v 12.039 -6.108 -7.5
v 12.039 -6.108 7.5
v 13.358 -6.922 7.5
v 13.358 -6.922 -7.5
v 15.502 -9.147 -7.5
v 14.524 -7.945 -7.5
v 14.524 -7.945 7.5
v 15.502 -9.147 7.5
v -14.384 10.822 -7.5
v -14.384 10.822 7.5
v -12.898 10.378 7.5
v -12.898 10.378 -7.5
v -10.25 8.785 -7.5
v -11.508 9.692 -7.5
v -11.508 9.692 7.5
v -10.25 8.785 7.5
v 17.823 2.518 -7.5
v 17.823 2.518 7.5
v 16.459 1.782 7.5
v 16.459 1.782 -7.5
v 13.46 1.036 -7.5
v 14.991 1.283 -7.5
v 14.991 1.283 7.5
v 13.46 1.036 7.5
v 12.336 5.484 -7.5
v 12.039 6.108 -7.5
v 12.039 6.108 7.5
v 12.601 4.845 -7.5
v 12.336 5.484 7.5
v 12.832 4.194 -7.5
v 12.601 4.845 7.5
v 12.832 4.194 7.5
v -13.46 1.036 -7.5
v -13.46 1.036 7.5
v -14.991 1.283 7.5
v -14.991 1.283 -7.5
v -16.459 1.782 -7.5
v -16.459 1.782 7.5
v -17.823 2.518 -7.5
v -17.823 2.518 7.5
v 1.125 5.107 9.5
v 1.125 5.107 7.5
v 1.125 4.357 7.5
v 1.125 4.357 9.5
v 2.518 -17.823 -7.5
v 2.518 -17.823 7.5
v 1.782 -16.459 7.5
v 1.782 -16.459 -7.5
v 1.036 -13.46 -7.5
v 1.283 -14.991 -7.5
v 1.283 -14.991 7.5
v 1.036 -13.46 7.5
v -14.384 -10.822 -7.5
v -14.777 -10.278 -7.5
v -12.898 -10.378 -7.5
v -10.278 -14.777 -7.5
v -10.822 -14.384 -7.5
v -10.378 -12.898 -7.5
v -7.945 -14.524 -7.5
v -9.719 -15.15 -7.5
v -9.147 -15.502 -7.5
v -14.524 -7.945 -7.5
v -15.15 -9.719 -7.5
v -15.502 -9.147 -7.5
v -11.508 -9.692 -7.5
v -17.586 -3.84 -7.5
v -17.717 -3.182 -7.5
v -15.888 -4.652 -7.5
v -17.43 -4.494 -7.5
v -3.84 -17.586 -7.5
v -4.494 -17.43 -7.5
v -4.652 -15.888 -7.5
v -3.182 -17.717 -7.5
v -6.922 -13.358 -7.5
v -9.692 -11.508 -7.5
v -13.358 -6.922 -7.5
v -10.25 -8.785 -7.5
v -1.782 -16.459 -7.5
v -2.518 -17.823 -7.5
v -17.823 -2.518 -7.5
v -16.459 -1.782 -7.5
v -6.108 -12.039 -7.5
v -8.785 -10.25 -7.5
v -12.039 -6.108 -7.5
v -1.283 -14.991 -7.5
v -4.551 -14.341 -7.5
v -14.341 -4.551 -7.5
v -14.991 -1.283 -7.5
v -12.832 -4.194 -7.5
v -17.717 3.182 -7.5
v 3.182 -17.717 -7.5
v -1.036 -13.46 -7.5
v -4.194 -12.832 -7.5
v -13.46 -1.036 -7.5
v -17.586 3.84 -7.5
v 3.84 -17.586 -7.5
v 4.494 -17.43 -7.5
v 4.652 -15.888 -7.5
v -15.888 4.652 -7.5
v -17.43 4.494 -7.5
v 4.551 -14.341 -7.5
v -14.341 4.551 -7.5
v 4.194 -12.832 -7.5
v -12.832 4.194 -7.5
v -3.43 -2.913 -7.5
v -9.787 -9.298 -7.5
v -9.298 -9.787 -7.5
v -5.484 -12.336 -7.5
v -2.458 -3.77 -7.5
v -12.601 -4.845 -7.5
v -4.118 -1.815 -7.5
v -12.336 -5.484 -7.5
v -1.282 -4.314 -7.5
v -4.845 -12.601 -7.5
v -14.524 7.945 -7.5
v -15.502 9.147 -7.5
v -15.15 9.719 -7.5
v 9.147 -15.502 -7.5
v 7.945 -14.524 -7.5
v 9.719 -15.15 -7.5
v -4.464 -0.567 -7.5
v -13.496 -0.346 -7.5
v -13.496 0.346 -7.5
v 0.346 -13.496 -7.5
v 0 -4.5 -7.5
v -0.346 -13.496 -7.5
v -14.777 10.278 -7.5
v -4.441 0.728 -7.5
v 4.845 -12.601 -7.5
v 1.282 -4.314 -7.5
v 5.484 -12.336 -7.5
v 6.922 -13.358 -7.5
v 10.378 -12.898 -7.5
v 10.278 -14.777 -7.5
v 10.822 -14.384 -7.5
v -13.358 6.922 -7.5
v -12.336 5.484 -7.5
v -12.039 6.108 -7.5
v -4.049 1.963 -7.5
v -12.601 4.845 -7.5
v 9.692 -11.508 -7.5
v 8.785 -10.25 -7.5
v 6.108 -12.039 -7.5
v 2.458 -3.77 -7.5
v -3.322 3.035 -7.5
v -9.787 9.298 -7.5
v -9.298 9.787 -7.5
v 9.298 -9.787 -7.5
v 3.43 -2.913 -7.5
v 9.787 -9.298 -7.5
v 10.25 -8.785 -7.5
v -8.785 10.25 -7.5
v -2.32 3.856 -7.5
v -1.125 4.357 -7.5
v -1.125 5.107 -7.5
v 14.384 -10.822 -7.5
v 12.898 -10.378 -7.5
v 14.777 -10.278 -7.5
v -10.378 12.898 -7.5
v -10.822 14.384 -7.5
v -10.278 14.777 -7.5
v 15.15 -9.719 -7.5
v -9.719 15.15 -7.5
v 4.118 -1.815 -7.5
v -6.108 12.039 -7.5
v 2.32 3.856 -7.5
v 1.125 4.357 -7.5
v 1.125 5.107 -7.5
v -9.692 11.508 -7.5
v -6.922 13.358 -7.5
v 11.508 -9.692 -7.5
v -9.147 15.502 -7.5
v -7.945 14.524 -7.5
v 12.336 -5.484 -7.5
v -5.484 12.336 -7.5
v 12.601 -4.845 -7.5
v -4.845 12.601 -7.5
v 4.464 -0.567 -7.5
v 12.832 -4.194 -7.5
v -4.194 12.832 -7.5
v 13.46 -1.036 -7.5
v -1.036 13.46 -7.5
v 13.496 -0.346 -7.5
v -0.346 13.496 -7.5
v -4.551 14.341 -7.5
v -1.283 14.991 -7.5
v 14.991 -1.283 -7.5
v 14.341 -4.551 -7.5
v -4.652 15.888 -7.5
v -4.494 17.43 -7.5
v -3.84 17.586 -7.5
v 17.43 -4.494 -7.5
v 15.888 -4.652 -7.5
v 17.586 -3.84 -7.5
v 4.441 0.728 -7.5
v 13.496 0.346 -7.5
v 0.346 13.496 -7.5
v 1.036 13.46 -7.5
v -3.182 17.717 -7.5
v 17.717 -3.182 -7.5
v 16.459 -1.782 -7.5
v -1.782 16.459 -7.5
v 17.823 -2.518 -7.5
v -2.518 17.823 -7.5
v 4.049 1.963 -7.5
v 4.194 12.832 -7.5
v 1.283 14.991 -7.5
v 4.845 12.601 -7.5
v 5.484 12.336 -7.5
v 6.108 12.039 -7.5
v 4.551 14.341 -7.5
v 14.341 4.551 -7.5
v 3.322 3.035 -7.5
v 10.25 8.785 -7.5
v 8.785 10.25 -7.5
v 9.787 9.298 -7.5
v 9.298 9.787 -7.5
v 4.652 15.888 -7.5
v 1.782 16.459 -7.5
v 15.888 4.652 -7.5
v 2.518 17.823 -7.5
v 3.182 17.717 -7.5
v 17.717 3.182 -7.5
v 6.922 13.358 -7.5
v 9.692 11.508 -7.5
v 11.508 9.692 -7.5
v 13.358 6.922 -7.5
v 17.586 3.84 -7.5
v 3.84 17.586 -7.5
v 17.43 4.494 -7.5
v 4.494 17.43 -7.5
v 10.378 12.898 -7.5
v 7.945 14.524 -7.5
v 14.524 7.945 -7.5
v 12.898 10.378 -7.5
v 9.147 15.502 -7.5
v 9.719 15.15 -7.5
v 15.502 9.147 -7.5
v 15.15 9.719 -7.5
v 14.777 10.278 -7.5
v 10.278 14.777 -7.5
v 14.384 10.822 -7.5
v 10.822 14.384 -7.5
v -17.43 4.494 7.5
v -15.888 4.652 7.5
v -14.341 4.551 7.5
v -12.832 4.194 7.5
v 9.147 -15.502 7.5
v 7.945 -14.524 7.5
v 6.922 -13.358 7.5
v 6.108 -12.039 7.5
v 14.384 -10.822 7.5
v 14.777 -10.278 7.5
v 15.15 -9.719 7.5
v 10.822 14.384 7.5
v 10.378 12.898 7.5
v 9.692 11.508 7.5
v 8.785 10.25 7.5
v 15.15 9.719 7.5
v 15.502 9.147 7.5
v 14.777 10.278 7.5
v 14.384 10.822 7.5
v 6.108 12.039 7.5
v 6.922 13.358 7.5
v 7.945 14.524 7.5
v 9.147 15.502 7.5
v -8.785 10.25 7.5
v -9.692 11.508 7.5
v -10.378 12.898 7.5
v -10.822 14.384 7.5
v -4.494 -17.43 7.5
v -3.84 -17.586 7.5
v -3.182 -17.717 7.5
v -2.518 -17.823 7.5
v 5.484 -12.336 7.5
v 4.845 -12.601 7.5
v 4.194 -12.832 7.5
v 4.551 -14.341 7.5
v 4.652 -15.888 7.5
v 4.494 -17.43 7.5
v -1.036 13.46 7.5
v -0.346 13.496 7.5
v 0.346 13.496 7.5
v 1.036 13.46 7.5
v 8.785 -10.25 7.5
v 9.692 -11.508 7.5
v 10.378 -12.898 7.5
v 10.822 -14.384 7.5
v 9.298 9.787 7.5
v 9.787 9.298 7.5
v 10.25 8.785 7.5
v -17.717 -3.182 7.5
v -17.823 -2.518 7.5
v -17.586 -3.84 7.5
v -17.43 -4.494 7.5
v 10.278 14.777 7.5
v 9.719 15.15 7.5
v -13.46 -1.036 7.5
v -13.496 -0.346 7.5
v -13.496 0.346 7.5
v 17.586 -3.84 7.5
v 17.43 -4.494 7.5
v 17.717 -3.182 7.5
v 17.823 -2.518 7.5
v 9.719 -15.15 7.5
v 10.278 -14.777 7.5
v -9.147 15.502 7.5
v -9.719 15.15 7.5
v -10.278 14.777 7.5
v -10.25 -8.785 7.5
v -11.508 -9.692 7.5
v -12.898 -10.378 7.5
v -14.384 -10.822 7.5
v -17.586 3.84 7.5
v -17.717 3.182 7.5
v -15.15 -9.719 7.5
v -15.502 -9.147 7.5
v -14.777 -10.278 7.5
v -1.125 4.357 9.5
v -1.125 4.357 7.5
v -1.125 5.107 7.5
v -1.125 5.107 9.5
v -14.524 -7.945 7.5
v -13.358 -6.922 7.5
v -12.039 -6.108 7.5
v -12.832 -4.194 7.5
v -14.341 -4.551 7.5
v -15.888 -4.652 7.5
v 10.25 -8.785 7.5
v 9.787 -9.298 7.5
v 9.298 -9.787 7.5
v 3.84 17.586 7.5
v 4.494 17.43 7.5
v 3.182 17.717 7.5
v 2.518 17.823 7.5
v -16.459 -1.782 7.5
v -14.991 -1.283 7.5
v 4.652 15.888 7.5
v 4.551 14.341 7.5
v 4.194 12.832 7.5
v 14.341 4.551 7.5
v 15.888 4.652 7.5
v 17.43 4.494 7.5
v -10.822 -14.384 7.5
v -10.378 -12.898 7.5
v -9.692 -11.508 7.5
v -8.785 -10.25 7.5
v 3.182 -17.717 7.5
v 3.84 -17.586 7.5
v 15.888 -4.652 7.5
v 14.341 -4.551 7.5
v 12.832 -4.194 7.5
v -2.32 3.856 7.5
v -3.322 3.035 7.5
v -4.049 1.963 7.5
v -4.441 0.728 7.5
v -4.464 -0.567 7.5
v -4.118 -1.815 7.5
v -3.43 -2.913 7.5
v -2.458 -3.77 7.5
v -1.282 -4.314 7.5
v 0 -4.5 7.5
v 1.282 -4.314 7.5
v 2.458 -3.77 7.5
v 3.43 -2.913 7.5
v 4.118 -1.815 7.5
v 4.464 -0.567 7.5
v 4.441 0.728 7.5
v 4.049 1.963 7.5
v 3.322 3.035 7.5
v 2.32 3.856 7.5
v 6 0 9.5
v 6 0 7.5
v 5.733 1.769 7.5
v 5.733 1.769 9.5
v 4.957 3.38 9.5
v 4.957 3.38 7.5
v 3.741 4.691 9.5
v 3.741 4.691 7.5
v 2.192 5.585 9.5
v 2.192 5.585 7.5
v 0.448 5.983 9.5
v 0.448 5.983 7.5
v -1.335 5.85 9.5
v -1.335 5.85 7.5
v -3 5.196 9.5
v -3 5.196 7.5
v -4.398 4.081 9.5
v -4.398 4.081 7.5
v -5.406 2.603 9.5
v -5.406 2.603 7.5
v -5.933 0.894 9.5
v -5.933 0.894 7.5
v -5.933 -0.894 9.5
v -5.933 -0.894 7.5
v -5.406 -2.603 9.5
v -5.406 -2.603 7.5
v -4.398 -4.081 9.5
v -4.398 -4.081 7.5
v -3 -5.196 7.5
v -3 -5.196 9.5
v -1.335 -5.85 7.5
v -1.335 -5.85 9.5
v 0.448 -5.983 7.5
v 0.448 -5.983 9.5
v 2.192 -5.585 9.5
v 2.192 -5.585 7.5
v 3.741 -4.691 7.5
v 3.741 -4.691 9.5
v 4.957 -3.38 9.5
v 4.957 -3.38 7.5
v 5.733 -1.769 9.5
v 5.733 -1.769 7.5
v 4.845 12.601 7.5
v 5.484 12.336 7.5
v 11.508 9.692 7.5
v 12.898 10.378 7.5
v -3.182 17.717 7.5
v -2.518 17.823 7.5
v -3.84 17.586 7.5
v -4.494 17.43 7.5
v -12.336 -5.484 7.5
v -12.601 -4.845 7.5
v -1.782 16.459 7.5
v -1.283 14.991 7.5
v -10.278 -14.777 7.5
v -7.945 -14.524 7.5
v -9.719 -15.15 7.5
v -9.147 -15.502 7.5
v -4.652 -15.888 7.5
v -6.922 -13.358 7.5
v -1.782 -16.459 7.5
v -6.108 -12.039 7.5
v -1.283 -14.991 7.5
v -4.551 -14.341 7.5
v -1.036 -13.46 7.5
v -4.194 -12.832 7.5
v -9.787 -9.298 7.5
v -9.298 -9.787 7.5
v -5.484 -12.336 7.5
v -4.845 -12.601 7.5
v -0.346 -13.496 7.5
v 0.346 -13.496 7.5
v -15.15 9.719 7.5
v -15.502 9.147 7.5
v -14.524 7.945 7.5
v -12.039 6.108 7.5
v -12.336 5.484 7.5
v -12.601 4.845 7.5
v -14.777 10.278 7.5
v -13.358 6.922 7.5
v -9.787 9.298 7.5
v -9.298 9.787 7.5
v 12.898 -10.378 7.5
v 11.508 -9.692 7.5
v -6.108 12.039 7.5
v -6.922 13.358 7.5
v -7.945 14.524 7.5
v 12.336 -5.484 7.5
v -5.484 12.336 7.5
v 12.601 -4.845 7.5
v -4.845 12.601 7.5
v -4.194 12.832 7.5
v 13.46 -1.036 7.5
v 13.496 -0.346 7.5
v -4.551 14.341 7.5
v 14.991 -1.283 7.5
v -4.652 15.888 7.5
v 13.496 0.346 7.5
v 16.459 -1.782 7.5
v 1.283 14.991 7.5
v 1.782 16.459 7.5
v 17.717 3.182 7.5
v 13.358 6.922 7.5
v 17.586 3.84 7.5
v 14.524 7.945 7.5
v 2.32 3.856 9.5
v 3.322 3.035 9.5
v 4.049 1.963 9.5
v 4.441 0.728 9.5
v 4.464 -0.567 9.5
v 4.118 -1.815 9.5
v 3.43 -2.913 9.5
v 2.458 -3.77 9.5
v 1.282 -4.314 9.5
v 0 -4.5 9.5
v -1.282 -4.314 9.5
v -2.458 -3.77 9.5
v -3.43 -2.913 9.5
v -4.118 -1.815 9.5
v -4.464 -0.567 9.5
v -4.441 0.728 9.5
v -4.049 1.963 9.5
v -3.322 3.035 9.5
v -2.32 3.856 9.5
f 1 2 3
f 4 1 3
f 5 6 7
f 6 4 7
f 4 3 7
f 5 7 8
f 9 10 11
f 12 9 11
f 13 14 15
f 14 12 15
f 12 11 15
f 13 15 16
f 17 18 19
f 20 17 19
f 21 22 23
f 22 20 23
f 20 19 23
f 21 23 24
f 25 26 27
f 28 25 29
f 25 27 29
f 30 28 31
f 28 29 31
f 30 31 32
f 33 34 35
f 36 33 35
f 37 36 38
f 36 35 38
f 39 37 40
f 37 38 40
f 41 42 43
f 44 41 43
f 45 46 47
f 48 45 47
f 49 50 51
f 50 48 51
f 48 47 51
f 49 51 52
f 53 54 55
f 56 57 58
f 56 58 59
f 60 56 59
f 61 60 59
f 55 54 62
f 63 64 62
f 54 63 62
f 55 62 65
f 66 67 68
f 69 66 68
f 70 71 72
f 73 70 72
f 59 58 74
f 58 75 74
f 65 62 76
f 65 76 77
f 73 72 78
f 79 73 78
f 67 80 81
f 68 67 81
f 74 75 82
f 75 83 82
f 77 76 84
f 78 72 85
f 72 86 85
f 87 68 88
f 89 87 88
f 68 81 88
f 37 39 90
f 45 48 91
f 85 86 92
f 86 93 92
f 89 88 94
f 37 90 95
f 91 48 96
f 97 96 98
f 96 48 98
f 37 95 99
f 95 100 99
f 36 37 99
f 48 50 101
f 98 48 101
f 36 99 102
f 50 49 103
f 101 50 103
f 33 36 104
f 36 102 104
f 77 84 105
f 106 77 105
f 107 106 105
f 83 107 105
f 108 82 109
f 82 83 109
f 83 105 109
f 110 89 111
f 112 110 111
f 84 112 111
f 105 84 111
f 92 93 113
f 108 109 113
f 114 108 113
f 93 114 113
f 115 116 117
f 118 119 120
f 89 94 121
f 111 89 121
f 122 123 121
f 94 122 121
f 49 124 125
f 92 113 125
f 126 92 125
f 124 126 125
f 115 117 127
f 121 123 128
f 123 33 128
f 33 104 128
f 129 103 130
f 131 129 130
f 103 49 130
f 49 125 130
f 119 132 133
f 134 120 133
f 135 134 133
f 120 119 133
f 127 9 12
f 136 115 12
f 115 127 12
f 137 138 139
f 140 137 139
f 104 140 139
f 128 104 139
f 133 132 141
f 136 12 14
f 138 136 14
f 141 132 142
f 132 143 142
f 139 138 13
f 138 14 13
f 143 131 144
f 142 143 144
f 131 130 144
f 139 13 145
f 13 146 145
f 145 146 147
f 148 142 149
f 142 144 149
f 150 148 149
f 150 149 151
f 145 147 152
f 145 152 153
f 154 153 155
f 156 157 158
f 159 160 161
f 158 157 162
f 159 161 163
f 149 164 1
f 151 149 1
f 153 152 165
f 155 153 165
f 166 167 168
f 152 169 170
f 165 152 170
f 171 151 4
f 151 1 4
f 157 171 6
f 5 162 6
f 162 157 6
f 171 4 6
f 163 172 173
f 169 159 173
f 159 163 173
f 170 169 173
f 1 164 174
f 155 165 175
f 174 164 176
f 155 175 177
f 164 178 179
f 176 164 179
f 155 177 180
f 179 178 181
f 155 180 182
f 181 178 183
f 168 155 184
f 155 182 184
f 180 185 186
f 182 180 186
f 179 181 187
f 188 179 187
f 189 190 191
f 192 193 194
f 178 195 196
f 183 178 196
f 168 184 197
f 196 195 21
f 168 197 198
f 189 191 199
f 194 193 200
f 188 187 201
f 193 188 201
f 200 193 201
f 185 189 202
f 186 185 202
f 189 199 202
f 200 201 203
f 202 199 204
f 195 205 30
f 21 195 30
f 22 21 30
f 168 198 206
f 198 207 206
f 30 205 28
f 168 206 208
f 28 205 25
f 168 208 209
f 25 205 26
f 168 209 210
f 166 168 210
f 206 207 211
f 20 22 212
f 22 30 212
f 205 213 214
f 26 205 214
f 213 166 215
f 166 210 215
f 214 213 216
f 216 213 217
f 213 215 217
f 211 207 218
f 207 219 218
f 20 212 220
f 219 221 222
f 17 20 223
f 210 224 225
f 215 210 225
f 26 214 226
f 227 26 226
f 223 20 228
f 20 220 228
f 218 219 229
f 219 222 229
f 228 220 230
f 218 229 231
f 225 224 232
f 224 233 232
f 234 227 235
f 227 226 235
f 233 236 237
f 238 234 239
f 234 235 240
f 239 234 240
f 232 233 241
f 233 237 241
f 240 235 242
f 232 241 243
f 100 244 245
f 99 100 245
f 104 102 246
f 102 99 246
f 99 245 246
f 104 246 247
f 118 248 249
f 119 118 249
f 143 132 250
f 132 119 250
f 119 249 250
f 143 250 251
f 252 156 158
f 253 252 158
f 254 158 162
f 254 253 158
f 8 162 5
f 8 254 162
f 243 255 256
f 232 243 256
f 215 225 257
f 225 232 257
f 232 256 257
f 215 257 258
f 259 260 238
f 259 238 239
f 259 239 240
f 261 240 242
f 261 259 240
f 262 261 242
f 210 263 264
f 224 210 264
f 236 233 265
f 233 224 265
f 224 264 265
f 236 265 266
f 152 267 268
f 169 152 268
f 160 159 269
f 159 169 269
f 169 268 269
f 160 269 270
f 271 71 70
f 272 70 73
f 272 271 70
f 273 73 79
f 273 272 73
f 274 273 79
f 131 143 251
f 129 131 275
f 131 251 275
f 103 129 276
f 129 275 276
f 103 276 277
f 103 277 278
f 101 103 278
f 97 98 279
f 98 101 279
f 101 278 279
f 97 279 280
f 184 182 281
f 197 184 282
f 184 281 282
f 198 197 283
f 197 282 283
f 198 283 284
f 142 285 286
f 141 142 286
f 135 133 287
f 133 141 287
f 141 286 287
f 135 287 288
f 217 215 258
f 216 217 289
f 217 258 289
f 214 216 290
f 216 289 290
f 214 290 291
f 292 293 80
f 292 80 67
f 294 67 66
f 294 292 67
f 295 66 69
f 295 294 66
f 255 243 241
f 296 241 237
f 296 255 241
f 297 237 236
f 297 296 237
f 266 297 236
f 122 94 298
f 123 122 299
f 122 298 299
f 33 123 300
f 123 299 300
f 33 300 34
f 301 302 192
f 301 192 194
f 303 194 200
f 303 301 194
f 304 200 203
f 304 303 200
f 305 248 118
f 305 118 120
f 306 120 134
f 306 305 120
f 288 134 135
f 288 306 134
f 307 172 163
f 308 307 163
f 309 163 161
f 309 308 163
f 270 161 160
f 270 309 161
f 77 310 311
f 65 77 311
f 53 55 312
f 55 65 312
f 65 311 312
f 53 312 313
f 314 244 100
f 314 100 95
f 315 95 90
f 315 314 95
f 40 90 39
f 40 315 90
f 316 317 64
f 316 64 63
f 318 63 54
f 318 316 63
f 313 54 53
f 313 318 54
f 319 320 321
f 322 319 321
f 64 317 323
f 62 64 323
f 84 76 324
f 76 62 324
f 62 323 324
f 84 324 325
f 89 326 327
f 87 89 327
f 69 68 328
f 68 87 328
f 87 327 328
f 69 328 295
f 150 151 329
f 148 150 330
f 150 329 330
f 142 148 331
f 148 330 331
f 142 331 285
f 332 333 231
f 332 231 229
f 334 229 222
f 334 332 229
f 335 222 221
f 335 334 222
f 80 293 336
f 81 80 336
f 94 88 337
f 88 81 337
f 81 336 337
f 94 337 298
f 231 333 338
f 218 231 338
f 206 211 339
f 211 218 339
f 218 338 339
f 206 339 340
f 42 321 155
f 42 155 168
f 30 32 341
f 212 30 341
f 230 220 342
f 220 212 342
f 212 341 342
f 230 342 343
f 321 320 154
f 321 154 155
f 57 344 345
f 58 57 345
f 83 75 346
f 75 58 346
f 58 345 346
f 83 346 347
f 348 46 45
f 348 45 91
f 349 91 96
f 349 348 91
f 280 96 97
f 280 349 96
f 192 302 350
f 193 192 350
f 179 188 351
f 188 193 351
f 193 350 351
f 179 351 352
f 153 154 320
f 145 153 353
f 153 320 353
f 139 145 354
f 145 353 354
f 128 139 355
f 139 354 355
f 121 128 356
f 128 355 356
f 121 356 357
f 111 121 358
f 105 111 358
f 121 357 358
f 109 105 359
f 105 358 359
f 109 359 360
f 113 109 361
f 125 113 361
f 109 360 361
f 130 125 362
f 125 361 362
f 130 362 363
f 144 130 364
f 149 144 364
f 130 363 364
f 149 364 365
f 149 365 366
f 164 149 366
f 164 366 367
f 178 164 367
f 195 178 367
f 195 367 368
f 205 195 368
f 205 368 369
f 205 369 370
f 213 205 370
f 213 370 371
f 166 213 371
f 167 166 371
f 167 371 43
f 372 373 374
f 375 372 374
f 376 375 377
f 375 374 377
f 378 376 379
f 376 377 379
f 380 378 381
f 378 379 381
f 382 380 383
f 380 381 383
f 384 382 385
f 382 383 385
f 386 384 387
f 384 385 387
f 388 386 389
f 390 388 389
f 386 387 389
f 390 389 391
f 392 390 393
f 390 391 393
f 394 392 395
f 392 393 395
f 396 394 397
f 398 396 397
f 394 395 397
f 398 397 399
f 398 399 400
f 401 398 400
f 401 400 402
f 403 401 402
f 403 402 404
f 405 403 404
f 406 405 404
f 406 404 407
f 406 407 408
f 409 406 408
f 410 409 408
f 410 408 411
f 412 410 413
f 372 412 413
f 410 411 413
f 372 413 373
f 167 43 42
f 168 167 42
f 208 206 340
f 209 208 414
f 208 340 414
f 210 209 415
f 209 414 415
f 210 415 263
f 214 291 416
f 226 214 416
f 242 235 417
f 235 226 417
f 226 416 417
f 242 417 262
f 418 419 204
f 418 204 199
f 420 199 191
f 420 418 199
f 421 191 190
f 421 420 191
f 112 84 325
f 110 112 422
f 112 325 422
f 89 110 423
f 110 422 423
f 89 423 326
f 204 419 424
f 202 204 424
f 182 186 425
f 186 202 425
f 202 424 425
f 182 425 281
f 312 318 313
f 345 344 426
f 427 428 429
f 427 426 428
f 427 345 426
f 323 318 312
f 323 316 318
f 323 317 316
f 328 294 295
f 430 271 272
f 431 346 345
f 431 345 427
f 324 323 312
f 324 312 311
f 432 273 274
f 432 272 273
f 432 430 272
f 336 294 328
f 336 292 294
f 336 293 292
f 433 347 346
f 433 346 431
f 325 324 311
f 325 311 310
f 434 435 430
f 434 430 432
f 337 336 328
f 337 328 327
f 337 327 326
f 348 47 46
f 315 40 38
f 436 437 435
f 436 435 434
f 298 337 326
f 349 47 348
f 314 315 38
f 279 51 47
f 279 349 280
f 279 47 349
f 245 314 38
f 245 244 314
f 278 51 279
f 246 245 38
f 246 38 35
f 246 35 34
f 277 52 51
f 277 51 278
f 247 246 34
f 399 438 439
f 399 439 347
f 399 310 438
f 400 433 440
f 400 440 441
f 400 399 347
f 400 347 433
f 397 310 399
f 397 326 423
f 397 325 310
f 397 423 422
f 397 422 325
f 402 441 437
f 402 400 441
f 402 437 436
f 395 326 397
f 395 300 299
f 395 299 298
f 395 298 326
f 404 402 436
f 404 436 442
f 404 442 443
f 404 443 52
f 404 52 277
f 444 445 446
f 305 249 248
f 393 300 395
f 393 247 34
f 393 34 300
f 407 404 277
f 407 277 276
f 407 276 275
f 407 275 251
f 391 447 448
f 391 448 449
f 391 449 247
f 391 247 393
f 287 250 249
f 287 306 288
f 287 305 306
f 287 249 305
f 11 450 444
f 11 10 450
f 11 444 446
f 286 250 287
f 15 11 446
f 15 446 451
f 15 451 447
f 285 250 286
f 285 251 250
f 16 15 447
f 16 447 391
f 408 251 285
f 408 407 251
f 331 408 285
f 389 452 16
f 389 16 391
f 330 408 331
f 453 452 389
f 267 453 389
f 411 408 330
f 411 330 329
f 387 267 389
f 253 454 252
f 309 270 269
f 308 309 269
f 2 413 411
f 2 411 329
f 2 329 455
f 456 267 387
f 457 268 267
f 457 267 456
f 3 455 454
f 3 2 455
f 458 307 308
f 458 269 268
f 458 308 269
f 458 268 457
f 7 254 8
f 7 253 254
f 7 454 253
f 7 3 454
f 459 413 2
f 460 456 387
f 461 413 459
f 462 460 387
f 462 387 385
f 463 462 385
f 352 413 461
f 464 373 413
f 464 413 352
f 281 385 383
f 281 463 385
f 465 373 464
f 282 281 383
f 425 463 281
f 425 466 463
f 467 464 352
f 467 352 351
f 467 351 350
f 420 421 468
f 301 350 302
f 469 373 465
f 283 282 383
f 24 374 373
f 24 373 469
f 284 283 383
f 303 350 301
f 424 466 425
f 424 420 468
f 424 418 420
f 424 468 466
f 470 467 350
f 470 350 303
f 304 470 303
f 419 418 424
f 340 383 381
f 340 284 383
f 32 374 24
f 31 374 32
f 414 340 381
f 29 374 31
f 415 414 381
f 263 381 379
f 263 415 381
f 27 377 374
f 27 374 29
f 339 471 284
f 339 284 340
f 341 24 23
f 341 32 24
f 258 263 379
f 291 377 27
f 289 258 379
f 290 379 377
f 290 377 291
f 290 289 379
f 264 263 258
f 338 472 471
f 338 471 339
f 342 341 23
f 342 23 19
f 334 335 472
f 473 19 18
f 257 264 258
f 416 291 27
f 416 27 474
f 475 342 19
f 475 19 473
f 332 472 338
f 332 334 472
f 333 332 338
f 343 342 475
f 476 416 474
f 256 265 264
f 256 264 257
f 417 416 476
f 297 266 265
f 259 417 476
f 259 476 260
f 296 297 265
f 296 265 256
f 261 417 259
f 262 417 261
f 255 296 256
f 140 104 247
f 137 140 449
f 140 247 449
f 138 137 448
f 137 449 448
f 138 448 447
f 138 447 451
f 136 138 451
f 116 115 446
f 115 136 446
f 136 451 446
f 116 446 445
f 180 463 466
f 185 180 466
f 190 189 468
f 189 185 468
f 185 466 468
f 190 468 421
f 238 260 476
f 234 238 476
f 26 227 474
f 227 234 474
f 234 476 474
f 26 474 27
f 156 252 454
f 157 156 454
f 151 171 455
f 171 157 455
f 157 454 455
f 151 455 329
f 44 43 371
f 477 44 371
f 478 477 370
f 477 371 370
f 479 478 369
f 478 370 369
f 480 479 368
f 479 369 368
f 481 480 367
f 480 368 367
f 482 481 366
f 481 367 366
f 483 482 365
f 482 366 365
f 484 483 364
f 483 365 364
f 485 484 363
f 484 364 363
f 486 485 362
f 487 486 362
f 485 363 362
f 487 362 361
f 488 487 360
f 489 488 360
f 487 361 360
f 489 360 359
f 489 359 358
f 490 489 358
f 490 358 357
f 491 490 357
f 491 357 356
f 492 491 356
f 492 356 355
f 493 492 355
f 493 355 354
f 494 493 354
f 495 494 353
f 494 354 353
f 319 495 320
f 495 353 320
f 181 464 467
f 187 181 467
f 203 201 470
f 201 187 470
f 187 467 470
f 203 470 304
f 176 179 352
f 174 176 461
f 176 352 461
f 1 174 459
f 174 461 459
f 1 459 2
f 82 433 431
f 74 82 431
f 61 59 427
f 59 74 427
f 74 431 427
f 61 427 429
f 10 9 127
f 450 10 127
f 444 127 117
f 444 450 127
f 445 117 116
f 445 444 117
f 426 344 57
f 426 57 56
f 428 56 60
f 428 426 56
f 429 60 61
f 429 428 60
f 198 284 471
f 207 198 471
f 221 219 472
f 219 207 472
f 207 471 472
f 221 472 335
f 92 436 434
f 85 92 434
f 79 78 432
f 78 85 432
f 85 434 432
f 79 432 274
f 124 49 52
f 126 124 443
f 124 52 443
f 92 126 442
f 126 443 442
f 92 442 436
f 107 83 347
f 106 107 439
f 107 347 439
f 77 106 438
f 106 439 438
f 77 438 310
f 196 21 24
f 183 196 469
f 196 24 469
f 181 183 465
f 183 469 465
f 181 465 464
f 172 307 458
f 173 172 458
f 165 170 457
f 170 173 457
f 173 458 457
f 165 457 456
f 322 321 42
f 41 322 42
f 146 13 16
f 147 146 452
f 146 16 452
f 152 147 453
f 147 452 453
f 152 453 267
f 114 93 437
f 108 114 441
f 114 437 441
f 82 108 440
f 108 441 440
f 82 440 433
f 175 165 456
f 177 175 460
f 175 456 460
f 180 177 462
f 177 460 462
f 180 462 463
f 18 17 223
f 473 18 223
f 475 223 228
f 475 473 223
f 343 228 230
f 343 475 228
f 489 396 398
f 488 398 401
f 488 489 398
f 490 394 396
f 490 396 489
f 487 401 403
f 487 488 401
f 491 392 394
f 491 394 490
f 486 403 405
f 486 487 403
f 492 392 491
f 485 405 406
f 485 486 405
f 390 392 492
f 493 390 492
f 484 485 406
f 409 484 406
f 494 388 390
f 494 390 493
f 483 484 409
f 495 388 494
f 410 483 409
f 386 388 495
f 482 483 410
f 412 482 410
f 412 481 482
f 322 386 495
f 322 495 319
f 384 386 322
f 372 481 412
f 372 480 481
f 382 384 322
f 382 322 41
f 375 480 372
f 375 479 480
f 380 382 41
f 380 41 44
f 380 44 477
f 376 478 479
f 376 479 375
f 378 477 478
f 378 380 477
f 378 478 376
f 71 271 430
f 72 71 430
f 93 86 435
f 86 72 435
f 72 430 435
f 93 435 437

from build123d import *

# Parameters (mm, degrees)
SKETCH1_R               = 18
BOSS_EXTRUDE1_DEPTH     = 7.5
CUT_EXTRUDE1_DEPTH      = 8.5
SKETCH3_R               = 6
BOSS_EXTRUDE2_DEPTH     = 2
SKETCH3_3_W             = 2.25
SKETCH3_3_H             = 1.5
CUT_EXTRUDE2_DEPTH      = 3
CUT_EXTRUDE2_DEPTH_BACK = 16
CIRPATTERN1_COUNT       = 16


with BuildPart() as part:
    # Sketch1 → Boss-Extrude1 (new body, symmetric)
    with BuildSketch(Plane.XY):
        Circle(SKETCH1_R)
    extrude(amount=BOSS_EXTRUDE1_DEPTH, both=True)

    # Sketch2 → Cut-Extrude1 (cut, symmetric)
    with BuildSketch(Plane.XY):
        with BuildLine():
            ThreePointArc((-2.51847991, 17.822941927), (-1.502149502, 15.735029188), (-1.035799814, 13.460205004))
            ThreePointArc((-1.035799814, 13.460205004), (0, 13.5), (1.035799814, 13.460205004))
            ThreePointArc((1.035799814, 13.460205004), (1.502149502, 15.735029188), (2.51847991, 17.822941927))
            ThreePointArc((2.51847991, 17.822941927), (0, 18), (-2.51847991, 17.822941927))
        make_face()
    cut_extrude1 = extrude(amount=CUT_EXTRUDE1_DEPTH, both=True, mode=Mode.SUBTRACT)

    # Sketch3 → Boss-Extrude2 (add)
    with BuildSketch(Plane.XY.offset(7.5)):
        Circle(SKETCH3_R)
        with BuildLine():
            ThreePointArc((1.125, 4.357106264), (0, -4.5), (-1.125, 4.357106264))
            Line((-1.125, 4.357106264), (-1.125, 5.107106264))
            Line((-1.125, 5.107106264), (1.125, 5.107106264))
            Line((1.125, 5.107106264), (1.125, 4.357106264))
        make_face(mode=Mode.SUBTRACT)
    extrude(amount=BOSS_EXTRUDE2_DEPTH)

    # Sketch3<3> → Cut-Extrude2 (cut, two sides)
    with BuildSketch(Plane.XY.offset(7.5)) as cut_extrude2_sk:
        with BuildLine():
            Line((1.125, 3.607106264), (-1.125, 3.607106264))
            Line((-1.125, 3.607106264), (-1.125, 4.357106264))
            ThreePointArc((-1.125, 4.357106264), (0, -4.5), (1.125, 4.357106264))
            Line((1.125, 4.357106264), (1.125, 3.607106264))
        make_face()
        with Locations((0, 4.357106264)):
            Rectangle(SKETCH3_3_W, SKETCH3_3_H)
    extrude(amount=CUT_EXTRUDE2_DEPTH, mode=Mode.SUBTRACT)
    extrude(cut_extrude2_sk.sketch, amount=-CUT_EXTRUDE2_DEPTH_BACK, mode=Mode.SUBTRACT)

    # CirPattern1: Cut-Extrude1 ×16 about axis
    cirpattern1_axis = Axis((0, 0, 0), (0, 0, 1))
    for i in range(1, CIRPATTERN1_COUNT):
        add(cut_extrude1.rotate(cirpattern1_axis, i * 360 / CIRPATTERN1_COUNT), mode=Mode.SUBTRACT)


solid = part.part
